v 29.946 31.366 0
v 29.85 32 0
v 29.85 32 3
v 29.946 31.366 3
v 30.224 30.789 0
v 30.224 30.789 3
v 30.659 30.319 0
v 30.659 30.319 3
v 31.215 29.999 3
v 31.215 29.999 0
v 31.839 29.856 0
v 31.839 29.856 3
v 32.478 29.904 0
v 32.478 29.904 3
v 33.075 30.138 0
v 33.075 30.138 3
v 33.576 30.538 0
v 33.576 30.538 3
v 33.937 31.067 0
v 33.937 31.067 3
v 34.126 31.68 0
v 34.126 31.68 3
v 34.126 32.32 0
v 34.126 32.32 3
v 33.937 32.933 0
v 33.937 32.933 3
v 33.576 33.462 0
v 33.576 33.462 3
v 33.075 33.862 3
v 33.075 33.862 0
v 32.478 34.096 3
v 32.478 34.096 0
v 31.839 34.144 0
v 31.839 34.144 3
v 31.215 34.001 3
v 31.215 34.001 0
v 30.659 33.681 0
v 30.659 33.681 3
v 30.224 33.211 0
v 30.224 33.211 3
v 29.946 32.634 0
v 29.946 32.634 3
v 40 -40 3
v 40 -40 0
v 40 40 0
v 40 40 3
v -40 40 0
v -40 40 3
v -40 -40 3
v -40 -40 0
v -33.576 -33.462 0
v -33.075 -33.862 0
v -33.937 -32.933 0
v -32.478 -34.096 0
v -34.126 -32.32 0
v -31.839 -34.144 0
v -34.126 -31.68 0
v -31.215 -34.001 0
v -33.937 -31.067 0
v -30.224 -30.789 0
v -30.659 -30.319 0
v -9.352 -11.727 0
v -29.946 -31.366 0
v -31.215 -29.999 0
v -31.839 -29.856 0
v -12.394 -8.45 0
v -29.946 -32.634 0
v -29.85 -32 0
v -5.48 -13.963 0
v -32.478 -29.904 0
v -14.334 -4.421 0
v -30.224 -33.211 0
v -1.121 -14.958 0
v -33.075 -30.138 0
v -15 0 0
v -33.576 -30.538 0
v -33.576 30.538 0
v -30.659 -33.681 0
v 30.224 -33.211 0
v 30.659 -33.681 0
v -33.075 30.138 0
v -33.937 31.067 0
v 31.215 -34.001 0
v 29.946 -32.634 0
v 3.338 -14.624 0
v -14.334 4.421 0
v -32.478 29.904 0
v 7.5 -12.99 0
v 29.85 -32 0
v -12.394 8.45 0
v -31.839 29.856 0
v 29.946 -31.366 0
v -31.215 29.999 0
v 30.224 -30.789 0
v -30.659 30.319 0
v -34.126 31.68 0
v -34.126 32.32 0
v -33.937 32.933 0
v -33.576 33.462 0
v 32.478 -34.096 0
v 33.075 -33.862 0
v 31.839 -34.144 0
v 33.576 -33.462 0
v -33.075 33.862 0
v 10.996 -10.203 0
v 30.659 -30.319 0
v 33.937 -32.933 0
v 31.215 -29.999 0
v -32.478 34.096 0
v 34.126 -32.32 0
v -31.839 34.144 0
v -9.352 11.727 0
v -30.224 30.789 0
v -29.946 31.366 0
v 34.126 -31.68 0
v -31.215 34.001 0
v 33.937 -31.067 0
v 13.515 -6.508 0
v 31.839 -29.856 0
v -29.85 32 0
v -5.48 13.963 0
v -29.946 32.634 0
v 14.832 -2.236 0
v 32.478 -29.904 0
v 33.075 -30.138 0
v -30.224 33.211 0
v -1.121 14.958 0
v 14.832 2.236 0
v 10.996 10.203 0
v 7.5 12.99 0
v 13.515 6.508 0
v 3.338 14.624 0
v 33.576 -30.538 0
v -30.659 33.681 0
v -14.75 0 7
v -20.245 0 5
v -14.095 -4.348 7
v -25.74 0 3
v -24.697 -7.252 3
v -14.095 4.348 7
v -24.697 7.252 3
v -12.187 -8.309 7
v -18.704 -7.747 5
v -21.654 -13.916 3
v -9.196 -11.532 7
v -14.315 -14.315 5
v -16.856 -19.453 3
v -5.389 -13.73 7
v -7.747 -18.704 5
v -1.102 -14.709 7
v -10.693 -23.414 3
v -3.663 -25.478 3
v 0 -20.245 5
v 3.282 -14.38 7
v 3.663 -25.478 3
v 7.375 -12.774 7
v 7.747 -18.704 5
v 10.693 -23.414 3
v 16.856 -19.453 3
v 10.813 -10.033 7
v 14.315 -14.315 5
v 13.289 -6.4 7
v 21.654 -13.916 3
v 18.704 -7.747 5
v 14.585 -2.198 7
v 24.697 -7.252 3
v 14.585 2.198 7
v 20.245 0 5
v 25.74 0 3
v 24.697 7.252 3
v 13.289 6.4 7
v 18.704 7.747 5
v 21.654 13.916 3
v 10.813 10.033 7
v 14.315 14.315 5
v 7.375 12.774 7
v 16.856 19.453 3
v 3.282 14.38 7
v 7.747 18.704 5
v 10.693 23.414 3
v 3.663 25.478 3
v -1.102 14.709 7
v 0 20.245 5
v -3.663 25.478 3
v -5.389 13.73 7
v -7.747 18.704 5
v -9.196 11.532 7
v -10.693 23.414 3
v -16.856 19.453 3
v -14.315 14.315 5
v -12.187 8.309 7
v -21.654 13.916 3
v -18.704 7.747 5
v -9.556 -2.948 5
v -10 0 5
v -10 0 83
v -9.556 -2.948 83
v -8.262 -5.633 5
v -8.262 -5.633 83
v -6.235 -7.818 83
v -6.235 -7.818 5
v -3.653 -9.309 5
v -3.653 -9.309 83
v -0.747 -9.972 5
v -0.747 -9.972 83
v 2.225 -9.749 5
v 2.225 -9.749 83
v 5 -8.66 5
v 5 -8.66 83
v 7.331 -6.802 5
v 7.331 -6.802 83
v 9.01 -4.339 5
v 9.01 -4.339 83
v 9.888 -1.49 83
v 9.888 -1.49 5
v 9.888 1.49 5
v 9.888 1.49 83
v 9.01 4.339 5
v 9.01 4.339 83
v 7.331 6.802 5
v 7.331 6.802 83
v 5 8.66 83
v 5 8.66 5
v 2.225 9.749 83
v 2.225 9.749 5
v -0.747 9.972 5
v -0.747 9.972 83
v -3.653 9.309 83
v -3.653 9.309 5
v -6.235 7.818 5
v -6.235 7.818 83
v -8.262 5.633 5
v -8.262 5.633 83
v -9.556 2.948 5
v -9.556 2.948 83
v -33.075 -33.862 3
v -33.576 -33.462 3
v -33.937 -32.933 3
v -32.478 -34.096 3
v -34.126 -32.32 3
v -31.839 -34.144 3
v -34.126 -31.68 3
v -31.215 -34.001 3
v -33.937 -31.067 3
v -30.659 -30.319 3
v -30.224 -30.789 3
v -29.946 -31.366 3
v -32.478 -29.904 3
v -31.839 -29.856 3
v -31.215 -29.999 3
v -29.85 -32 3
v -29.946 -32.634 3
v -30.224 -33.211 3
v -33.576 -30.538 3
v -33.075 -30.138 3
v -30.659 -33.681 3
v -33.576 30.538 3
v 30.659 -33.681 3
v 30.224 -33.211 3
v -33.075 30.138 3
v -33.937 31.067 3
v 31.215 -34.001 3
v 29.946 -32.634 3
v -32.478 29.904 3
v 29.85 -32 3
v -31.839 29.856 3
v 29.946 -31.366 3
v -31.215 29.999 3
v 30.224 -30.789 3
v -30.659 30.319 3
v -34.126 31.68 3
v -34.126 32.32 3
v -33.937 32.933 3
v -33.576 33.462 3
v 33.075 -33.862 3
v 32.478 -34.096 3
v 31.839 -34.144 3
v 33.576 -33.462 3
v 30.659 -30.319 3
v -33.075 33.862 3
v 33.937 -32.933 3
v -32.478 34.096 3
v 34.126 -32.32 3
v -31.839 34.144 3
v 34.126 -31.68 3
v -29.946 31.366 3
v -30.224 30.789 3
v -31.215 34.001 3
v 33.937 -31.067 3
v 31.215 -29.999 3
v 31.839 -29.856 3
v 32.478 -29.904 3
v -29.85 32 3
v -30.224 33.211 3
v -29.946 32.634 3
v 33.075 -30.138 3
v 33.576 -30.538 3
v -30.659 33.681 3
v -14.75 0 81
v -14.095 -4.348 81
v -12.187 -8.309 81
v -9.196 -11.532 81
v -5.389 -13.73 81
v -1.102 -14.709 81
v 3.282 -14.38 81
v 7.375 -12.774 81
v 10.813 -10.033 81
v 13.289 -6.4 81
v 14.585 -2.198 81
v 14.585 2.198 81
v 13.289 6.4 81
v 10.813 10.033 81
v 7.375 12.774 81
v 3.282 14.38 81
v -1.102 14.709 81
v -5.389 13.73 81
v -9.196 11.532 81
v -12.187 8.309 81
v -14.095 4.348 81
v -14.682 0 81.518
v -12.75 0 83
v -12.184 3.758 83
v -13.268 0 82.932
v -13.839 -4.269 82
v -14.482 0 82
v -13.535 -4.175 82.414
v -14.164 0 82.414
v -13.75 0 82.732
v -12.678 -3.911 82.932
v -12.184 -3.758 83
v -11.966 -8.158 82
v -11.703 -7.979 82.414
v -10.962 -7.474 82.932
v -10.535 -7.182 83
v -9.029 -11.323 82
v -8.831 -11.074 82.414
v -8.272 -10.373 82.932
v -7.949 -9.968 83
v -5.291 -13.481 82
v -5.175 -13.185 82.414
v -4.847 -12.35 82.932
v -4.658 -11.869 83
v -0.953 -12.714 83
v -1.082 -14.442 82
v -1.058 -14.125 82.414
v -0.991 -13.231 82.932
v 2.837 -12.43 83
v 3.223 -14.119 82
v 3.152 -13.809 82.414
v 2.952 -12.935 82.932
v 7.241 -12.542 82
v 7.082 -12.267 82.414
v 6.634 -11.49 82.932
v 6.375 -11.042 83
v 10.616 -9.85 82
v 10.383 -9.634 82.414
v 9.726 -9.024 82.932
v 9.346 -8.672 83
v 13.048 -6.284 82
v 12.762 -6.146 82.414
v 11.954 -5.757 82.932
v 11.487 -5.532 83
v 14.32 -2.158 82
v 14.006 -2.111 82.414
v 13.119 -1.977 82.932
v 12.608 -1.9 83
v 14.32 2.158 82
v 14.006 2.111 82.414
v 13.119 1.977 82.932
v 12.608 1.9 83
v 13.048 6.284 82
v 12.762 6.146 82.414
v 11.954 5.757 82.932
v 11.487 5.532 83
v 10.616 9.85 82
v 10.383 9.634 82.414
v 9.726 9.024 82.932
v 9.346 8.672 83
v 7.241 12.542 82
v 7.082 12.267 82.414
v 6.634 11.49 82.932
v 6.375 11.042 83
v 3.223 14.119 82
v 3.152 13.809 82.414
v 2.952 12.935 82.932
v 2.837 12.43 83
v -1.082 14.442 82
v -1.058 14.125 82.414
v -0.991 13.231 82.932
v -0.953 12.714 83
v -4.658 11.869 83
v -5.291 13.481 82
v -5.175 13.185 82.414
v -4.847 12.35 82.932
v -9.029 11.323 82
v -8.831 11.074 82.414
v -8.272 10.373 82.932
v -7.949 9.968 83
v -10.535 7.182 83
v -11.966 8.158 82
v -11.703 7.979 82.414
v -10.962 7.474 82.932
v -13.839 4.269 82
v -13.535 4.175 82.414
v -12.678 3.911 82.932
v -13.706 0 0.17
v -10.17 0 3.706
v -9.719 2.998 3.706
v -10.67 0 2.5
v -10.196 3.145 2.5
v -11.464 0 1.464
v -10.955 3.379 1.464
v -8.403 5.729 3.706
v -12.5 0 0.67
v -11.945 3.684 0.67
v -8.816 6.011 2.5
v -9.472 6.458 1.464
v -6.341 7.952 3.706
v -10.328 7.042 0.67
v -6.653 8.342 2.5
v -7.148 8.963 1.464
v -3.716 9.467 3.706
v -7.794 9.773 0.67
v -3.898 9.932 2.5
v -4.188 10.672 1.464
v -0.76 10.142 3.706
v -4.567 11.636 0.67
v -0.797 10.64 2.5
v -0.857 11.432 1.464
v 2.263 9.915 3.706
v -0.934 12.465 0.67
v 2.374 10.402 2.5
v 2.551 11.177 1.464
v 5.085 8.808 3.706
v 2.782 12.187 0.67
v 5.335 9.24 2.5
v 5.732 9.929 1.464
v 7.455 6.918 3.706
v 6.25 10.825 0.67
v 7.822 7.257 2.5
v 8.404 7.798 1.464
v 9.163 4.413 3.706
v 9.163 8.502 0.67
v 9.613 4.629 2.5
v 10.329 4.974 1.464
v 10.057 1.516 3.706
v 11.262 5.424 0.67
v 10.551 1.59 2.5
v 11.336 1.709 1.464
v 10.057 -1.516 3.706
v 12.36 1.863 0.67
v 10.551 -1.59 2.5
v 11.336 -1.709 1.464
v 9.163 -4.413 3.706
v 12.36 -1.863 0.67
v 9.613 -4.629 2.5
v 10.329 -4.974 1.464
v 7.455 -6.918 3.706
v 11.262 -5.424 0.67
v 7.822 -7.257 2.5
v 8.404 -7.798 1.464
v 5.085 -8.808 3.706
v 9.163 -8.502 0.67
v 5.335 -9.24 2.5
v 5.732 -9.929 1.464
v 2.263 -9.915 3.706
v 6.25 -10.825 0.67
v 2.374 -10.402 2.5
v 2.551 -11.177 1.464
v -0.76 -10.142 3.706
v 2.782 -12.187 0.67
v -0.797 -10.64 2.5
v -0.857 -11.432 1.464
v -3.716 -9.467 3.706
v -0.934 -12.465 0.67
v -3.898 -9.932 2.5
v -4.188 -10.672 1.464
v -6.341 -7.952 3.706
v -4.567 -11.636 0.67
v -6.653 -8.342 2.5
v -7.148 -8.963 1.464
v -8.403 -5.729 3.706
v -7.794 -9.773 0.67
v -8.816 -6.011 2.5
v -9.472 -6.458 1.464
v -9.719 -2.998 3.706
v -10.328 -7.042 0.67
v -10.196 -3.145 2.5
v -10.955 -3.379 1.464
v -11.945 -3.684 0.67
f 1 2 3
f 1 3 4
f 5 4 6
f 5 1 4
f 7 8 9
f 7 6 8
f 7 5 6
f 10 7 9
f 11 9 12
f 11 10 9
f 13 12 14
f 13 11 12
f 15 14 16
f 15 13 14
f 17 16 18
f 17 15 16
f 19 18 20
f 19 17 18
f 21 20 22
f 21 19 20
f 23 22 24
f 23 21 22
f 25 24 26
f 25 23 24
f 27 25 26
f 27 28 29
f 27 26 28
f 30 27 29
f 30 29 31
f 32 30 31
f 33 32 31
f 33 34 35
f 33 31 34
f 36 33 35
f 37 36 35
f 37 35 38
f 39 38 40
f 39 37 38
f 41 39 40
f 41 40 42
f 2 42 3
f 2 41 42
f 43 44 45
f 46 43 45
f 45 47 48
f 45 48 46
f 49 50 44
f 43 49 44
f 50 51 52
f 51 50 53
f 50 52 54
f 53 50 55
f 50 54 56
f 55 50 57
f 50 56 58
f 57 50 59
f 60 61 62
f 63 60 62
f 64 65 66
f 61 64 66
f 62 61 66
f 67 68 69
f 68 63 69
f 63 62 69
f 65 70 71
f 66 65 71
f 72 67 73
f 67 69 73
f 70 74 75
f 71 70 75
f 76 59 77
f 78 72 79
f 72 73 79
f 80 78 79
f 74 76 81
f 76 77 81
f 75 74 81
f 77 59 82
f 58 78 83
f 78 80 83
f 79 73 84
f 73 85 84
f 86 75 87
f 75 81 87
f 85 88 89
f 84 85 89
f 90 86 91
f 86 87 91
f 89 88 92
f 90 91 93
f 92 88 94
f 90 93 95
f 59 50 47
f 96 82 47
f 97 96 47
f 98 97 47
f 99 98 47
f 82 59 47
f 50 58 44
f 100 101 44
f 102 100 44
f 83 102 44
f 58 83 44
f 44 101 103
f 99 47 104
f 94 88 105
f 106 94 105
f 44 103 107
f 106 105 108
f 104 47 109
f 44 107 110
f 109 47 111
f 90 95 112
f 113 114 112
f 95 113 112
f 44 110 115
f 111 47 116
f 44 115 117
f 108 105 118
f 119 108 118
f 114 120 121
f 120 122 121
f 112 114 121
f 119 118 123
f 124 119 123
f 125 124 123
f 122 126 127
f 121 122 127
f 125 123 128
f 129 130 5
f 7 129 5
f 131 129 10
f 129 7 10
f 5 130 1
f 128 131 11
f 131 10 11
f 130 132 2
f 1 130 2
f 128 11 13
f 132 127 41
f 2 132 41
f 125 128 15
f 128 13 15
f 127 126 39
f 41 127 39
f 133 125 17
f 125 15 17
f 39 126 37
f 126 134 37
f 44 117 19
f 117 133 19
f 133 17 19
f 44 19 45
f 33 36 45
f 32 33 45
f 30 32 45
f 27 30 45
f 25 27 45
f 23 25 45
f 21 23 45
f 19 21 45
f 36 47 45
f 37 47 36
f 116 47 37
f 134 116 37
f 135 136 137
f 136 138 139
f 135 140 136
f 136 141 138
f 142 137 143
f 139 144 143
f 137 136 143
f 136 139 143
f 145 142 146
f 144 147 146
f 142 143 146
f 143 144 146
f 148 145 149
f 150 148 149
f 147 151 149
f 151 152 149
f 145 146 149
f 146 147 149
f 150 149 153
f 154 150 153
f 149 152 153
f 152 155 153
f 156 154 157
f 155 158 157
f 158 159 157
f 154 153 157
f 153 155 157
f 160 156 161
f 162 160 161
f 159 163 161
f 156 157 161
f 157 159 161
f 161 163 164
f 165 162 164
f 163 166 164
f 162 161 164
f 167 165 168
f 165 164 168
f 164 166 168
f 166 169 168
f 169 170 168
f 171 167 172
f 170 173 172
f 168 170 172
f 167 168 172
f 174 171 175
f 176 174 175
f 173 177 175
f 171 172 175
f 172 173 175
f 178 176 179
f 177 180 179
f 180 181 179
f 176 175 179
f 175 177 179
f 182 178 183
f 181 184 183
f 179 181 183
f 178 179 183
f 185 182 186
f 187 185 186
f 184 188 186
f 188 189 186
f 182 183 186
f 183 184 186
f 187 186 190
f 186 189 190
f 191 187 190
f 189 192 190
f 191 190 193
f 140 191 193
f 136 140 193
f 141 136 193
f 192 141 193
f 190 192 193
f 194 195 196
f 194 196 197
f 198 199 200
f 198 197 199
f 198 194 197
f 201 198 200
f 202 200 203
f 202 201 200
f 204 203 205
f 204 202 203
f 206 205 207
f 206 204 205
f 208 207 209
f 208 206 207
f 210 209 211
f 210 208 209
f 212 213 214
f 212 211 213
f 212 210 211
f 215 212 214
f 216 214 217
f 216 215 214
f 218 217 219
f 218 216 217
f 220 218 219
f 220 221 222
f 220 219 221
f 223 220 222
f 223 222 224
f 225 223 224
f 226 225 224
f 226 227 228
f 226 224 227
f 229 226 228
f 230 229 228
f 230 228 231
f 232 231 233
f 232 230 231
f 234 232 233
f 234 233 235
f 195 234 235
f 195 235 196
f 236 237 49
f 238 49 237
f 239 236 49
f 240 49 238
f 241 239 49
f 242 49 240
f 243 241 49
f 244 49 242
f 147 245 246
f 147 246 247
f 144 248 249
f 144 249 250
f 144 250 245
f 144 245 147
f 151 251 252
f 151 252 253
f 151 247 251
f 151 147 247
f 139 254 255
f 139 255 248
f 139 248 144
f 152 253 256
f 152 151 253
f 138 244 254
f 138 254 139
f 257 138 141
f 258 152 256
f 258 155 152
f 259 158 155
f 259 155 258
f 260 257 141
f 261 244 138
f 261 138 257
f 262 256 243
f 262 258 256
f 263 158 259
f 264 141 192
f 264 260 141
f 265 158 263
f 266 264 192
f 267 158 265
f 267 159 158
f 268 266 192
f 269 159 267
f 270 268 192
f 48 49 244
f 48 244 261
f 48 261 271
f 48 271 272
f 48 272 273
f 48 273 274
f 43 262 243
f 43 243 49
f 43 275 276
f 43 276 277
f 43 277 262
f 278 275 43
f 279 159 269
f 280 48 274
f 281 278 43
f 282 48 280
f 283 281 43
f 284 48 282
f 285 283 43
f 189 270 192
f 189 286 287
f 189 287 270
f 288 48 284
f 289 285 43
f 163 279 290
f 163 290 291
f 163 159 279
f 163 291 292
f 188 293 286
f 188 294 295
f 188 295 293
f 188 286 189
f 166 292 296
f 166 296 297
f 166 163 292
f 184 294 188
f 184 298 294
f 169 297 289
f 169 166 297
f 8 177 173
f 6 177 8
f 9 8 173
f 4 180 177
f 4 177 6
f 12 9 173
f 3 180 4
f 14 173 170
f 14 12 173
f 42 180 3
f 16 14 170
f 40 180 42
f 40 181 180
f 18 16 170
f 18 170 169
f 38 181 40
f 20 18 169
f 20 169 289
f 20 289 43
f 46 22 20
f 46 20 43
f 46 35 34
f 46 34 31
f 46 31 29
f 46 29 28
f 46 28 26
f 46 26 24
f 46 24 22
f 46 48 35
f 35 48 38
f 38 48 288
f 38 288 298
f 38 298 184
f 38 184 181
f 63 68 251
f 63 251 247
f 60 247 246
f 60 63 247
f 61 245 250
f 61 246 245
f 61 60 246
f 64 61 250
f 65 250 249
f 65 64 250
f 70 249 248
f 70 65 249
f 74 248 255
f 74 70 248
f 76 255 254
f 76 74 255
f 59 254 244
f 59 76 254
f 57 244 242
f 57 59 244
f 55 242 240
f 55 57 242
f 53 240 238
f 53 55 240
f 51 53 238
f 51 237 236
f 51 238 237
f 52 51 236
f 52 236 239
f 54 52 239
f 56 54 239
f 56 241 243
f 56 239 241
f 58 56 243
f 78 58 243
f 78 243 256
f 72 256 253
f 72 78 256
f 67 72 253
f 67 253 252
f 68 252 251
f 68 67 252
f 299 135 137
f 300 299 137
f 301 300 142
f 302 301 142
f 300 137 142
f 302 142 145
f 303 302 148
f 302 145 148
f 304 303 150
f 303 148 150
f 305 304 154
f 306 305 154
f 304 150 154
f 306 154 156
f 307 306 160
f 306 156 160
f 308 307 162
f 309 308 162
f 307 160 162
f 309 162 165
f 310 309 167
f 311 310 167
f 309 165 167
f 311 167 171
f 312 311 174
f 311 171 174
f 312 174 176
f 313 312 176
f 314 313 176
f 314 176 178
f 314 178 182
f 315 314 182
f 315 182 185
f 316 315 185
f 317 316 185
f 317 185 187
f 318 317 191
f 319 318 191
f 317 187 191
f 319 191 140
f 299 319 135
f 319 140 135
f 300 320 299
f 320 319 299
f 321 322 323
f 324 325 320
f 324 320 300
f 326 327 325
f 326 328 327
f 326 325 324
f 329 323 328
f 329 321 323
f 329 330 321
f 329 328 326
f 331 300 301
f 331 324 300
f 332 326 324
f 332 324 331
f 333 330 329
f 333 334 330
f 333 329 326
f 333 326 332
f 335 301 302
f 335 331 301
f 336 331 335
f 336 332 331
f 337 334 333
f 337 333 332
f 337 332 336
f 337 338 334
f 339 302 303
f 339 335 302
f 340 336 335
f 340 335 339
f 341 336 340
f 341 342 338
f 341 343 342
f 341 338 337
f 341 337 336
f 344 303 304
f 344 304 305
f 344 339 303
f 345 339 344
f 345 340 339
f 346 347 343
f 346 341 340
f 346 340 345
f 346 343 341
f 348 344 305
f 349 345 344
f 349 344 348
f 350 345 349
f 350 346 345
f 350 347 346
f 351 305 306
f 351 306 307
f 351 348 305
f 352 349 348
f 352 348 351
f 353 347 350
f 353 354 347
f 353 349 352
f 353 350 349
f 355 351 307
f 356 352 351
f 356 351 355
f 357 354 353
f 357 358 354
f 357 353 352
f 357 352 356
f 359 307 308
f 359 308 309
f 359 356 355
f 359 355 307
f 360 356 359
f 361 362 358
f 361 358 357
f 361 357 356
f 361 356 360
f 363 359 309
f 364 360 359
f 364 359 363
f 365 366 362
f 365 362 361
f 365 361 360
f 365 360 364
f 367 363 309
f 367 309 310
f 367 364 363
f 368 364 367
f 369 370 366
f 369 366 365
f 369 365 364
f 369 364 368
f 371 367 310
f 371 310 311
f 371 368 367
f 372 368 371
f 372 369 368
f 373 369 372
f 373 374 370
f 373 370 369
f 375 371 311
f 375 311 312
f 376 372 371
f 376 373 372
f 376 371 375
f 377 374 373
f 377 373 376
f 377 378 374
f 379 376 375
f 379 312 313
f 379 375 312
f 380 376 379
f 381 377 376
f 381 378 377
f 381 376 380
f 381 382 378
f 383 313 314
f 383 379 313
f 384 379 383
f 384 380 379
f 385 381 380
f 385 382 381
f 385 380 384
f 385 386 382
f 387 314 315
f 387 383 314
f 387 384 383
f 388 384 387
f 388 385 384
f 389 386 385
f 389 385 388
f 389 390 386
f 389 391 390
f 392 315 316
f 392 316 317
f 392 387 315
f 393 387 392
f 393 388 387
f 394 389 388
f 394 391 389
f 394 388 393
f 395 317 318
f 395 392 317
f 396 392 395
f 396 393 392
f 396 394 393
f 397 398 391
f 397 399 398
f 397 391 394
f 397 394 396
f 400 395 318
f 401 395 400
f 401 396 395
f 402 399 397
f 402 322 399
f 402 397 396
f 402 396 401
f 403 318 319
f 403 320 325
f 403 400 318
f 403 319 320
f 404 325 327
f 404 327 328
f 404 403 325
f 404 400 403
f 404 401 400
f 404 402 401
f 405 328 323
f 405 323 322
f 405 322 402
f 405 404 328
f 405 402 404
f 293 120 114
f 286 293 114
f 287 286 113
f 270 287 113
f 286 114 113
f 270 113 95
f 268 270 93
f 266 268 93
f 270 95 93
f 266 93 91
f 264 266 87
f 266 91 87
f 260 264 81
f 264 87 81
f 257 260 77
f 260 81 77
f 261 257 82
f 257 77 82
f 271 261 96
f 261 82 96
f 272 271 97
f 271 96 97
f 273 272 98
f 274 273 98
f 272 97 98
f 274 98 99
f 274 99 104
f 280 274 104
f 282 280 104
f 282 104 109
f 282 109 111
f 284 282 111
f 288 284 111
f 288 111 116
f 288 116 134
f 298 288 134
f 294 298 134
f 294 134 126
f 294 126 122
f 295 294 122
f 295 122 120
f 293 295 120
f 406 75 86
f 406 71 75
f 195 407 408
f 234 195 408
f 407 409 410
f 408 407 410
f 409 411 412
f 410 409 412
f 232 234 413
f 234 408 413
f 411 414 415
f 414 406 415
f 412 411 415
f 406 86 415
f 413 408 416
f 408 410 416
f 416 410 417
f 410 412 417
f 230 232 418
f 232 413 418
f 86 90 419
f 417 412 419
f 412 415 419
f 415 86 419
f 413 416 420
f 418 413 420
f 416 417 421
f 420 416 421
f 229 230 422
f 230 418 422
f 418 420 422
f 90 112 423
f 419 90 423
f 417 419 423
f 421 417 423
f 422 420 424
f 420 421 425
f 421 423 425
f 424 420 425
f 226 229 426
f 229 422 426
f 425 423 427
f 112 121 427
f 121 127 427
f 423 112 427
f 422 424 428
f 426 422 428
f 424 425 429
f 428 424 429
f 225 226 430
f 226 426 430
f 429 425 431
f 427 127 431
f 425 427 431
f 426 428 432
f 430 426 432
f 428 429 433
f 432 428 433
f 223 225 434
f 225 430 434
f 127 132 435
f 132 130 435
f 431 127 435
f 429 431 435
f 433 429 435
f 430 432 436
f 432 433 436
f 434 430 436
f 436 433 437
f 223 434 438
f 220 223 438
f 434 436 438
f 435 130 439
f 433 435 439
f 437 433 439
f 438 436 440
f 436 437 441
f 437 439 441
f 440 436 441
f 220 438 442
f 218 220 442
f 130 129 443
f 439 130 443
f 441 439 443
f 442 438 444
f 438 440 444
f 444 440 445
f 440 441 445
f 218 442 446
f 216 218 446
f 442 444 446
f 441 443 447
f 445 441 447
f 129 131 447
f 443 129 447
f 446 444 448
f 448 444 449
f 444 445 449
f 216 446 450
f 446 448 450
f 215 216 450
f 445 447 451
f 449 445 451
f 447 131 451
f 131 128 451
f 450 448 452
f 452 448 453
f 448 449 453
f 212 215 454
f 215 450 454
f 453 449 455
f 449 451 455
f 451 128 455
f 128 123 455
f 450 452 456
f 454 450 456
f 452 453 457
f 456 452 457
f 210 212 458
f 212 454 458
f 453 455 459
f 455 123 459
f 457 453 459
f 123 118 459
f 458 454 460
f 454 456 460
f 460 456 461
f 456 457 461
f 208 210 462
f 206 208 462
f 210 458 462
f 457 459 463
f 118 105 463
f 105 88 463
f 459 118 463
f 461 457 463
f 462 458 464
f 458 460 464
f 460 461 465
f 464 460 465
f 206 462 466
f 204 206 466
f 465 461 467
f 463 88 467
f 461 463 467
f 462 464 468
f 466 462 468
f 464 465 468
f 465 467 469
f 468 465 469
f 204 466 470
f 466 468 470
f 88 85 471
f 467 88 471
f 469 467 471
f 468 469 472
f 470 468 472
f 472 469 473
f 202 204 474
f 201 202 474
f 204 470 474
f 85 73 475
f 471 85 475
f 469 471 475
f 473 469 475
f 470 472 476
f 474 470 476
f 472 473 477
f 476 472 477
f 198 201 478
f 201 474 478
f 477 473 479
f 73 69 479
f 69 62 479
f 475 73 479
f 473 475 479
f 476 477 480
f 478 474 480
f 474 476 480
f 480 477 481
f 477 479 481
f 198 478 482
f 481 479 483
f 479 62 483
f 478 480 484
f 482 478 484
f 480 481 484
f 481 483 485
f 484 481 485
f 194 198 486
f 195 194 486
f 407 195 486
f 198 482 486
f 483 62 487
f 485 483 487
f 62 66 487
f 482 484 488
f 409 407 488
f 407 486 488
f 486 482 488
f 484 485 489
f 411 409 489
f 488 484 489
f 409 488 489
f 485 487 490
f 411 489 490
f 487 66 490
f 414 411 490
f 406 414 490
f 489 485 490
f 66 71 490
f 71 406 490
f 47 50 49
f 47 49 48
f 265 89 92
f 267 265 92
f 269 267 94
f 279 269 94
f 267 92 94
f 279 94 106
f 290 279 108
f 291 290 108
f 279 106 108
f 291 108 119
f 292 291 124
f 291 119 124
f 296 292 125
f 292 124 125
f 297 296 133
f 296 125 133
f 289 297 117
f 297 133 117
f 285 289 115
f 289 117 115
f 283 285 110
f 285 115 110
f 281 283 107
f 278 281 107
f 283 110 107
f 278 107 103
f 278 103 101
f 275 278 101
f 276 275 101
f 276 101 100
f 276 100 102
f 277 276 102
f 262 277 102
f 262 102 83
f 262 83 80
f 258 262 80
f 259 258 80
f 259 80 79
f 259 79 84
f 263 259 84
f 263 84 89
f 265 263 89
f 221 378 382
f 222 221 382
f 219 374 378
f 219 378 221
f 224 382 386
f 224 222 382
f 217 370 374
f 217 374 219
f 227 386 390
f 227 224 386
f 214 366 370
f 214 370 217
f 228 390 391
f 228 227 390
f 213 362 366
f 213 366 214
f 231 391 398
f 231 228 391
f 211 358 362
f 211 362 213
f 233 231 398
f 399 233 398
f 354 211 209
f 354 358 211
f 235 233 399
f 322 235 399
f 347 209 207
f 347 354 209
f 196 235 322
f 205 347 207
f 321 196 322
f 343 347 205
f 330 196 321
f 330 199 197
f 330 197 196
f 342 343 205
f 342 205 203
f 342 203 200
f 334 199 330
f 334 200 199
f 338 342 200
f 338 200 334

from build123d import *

# Parameters (mm, degrees)
ESQUISSE1_W                  = 80
ESQUISSE1_H                  = 80
BOSS_EXTRU_1_DEPTH           = 3
BOSS_EXTRU_2_START           = 3
ESQUISSE2_R                  = 14.75
BOSS_EXTRU_2_DEPTH           = 80
CONG_1_R                     = 2
CHANFREIN1_SIZE              = 4
CHANFREIN1_SIZE2             = 10.989909678
ENL_V_MAT_EXTRU_1_DEPTH      = 101.444014257
ENL_V_MAT_EXTRU_1_DEPTH_BACK = 101.444014257
ESQUISSE3_R                  = 10
CONG_2_R                     = 5
D_GAGEMENT_M43_D             = 4.3
SYM_TRIE2_COPY_1_D           = 4.3


with BuildPart() as part:
    # Esquisse1 → Boss.-Extru.1 (new body)
    with BuildSketch(Plane.XY):
        Rectangle(ESQUISSE1_W, ESQUISSE1_H)
    extrude(amount=BOSS_EXTRU_1_DEPTH)

    # Esquisse2 → Boss.-Extru.2 (add)
    with BuildSketch(Plane.XY.offset(BOSS_EXTRU_2_START)):
        with Locations(Location((0, 0, 0), (0, 0, 180))):
            Circle(ESQUISSE2_R)
    extrude(amount=BOSS_EXTRU_2_DEPTH)

    # Congé1
    cong_1_edges = [part.edges().sort_by_distance(p)[0] for p in [
        (14.75, 0, 83),
    ]]
    fillet(cong_1_edges, radius=CONG_1_R)

    # Chanfrein1
    chanfrein1_edges = [part.edges().sort_by_distance(p)[0] for p in [
        (14.75, 0, 3),
    ]]
    chanfrein1_side = [part.faces().sort_by_distance(p)[0] for p in [
        (14.75, 0, 42),
    ]]
    chamfer(chanfrein1_edges, length=CHANFREIN1_SIZE, length2=CHANFREIN1_SIZE2, reference=chanfrein1_side[0])

    # Esquisse3 → Enlèv. mat.-Extru.1 (cut, two sides: drawn at the far end of the back side and taken through both)
    with BuildSketch(Plane.XY.offset(-ENL_V_MAT_EXTRU_1_DEPTH_BACK)):
        with Locations(Location((0, 0, 0), (0, 0, 180))):
            Circle(ESQUISSE3_R)
    extrude(amount=ENL_V_MAT_EXTRU_1_DEPTH + ENL_V_MAT_EXTRU_1_DEPTH_BACK, mode=Mode.SUBTRACT)

    # Congé2
    cong_2_edges = [part.edges().sort_by_distance(p)[0] for p in [
        (10, 0, 0),
    ]]
    fillet(cong_2_edges, radius=CONG_2_R)

    # Dégagement M43 (through all)
    with Locations(Plane(origin=(3.971676253, 8.06271861, 3), x_dir=(1, 0, 0), z_dir=(0, 0, 1))):
        with Locations((28.028323747, -40.06271861)):
            d_gagement_m43 = Hole(D_GAGEMENT_M43_D / 2)

    # Symétrie1: Dégagement M43 across plane
    add(d_gagement_m43.mirror(Plane.ZX), mode=Mode.SUBTRACT)

    # Symétrie2: Dégagement M43 across plane
    add(d_gagement_m43.mirror(Plane(origin=(0, 0, 0), x_dir=(0, 0, 1), z_dir=(1, 0, 0))), mode=Mode.SUBTRACT)

    # Symétrie2 copy 1 (through all)
    with Locations(Plane(origin=(-3.971676253, -8.06271861, 3), x_dir=(-1, 0, 0), z_dir=(0, 0, 1))):
        with Locations((28.028323747, -40.06271861)):
            Hole(SYM_TRIE2_COPY_1_D / 2)


solid = part.part
